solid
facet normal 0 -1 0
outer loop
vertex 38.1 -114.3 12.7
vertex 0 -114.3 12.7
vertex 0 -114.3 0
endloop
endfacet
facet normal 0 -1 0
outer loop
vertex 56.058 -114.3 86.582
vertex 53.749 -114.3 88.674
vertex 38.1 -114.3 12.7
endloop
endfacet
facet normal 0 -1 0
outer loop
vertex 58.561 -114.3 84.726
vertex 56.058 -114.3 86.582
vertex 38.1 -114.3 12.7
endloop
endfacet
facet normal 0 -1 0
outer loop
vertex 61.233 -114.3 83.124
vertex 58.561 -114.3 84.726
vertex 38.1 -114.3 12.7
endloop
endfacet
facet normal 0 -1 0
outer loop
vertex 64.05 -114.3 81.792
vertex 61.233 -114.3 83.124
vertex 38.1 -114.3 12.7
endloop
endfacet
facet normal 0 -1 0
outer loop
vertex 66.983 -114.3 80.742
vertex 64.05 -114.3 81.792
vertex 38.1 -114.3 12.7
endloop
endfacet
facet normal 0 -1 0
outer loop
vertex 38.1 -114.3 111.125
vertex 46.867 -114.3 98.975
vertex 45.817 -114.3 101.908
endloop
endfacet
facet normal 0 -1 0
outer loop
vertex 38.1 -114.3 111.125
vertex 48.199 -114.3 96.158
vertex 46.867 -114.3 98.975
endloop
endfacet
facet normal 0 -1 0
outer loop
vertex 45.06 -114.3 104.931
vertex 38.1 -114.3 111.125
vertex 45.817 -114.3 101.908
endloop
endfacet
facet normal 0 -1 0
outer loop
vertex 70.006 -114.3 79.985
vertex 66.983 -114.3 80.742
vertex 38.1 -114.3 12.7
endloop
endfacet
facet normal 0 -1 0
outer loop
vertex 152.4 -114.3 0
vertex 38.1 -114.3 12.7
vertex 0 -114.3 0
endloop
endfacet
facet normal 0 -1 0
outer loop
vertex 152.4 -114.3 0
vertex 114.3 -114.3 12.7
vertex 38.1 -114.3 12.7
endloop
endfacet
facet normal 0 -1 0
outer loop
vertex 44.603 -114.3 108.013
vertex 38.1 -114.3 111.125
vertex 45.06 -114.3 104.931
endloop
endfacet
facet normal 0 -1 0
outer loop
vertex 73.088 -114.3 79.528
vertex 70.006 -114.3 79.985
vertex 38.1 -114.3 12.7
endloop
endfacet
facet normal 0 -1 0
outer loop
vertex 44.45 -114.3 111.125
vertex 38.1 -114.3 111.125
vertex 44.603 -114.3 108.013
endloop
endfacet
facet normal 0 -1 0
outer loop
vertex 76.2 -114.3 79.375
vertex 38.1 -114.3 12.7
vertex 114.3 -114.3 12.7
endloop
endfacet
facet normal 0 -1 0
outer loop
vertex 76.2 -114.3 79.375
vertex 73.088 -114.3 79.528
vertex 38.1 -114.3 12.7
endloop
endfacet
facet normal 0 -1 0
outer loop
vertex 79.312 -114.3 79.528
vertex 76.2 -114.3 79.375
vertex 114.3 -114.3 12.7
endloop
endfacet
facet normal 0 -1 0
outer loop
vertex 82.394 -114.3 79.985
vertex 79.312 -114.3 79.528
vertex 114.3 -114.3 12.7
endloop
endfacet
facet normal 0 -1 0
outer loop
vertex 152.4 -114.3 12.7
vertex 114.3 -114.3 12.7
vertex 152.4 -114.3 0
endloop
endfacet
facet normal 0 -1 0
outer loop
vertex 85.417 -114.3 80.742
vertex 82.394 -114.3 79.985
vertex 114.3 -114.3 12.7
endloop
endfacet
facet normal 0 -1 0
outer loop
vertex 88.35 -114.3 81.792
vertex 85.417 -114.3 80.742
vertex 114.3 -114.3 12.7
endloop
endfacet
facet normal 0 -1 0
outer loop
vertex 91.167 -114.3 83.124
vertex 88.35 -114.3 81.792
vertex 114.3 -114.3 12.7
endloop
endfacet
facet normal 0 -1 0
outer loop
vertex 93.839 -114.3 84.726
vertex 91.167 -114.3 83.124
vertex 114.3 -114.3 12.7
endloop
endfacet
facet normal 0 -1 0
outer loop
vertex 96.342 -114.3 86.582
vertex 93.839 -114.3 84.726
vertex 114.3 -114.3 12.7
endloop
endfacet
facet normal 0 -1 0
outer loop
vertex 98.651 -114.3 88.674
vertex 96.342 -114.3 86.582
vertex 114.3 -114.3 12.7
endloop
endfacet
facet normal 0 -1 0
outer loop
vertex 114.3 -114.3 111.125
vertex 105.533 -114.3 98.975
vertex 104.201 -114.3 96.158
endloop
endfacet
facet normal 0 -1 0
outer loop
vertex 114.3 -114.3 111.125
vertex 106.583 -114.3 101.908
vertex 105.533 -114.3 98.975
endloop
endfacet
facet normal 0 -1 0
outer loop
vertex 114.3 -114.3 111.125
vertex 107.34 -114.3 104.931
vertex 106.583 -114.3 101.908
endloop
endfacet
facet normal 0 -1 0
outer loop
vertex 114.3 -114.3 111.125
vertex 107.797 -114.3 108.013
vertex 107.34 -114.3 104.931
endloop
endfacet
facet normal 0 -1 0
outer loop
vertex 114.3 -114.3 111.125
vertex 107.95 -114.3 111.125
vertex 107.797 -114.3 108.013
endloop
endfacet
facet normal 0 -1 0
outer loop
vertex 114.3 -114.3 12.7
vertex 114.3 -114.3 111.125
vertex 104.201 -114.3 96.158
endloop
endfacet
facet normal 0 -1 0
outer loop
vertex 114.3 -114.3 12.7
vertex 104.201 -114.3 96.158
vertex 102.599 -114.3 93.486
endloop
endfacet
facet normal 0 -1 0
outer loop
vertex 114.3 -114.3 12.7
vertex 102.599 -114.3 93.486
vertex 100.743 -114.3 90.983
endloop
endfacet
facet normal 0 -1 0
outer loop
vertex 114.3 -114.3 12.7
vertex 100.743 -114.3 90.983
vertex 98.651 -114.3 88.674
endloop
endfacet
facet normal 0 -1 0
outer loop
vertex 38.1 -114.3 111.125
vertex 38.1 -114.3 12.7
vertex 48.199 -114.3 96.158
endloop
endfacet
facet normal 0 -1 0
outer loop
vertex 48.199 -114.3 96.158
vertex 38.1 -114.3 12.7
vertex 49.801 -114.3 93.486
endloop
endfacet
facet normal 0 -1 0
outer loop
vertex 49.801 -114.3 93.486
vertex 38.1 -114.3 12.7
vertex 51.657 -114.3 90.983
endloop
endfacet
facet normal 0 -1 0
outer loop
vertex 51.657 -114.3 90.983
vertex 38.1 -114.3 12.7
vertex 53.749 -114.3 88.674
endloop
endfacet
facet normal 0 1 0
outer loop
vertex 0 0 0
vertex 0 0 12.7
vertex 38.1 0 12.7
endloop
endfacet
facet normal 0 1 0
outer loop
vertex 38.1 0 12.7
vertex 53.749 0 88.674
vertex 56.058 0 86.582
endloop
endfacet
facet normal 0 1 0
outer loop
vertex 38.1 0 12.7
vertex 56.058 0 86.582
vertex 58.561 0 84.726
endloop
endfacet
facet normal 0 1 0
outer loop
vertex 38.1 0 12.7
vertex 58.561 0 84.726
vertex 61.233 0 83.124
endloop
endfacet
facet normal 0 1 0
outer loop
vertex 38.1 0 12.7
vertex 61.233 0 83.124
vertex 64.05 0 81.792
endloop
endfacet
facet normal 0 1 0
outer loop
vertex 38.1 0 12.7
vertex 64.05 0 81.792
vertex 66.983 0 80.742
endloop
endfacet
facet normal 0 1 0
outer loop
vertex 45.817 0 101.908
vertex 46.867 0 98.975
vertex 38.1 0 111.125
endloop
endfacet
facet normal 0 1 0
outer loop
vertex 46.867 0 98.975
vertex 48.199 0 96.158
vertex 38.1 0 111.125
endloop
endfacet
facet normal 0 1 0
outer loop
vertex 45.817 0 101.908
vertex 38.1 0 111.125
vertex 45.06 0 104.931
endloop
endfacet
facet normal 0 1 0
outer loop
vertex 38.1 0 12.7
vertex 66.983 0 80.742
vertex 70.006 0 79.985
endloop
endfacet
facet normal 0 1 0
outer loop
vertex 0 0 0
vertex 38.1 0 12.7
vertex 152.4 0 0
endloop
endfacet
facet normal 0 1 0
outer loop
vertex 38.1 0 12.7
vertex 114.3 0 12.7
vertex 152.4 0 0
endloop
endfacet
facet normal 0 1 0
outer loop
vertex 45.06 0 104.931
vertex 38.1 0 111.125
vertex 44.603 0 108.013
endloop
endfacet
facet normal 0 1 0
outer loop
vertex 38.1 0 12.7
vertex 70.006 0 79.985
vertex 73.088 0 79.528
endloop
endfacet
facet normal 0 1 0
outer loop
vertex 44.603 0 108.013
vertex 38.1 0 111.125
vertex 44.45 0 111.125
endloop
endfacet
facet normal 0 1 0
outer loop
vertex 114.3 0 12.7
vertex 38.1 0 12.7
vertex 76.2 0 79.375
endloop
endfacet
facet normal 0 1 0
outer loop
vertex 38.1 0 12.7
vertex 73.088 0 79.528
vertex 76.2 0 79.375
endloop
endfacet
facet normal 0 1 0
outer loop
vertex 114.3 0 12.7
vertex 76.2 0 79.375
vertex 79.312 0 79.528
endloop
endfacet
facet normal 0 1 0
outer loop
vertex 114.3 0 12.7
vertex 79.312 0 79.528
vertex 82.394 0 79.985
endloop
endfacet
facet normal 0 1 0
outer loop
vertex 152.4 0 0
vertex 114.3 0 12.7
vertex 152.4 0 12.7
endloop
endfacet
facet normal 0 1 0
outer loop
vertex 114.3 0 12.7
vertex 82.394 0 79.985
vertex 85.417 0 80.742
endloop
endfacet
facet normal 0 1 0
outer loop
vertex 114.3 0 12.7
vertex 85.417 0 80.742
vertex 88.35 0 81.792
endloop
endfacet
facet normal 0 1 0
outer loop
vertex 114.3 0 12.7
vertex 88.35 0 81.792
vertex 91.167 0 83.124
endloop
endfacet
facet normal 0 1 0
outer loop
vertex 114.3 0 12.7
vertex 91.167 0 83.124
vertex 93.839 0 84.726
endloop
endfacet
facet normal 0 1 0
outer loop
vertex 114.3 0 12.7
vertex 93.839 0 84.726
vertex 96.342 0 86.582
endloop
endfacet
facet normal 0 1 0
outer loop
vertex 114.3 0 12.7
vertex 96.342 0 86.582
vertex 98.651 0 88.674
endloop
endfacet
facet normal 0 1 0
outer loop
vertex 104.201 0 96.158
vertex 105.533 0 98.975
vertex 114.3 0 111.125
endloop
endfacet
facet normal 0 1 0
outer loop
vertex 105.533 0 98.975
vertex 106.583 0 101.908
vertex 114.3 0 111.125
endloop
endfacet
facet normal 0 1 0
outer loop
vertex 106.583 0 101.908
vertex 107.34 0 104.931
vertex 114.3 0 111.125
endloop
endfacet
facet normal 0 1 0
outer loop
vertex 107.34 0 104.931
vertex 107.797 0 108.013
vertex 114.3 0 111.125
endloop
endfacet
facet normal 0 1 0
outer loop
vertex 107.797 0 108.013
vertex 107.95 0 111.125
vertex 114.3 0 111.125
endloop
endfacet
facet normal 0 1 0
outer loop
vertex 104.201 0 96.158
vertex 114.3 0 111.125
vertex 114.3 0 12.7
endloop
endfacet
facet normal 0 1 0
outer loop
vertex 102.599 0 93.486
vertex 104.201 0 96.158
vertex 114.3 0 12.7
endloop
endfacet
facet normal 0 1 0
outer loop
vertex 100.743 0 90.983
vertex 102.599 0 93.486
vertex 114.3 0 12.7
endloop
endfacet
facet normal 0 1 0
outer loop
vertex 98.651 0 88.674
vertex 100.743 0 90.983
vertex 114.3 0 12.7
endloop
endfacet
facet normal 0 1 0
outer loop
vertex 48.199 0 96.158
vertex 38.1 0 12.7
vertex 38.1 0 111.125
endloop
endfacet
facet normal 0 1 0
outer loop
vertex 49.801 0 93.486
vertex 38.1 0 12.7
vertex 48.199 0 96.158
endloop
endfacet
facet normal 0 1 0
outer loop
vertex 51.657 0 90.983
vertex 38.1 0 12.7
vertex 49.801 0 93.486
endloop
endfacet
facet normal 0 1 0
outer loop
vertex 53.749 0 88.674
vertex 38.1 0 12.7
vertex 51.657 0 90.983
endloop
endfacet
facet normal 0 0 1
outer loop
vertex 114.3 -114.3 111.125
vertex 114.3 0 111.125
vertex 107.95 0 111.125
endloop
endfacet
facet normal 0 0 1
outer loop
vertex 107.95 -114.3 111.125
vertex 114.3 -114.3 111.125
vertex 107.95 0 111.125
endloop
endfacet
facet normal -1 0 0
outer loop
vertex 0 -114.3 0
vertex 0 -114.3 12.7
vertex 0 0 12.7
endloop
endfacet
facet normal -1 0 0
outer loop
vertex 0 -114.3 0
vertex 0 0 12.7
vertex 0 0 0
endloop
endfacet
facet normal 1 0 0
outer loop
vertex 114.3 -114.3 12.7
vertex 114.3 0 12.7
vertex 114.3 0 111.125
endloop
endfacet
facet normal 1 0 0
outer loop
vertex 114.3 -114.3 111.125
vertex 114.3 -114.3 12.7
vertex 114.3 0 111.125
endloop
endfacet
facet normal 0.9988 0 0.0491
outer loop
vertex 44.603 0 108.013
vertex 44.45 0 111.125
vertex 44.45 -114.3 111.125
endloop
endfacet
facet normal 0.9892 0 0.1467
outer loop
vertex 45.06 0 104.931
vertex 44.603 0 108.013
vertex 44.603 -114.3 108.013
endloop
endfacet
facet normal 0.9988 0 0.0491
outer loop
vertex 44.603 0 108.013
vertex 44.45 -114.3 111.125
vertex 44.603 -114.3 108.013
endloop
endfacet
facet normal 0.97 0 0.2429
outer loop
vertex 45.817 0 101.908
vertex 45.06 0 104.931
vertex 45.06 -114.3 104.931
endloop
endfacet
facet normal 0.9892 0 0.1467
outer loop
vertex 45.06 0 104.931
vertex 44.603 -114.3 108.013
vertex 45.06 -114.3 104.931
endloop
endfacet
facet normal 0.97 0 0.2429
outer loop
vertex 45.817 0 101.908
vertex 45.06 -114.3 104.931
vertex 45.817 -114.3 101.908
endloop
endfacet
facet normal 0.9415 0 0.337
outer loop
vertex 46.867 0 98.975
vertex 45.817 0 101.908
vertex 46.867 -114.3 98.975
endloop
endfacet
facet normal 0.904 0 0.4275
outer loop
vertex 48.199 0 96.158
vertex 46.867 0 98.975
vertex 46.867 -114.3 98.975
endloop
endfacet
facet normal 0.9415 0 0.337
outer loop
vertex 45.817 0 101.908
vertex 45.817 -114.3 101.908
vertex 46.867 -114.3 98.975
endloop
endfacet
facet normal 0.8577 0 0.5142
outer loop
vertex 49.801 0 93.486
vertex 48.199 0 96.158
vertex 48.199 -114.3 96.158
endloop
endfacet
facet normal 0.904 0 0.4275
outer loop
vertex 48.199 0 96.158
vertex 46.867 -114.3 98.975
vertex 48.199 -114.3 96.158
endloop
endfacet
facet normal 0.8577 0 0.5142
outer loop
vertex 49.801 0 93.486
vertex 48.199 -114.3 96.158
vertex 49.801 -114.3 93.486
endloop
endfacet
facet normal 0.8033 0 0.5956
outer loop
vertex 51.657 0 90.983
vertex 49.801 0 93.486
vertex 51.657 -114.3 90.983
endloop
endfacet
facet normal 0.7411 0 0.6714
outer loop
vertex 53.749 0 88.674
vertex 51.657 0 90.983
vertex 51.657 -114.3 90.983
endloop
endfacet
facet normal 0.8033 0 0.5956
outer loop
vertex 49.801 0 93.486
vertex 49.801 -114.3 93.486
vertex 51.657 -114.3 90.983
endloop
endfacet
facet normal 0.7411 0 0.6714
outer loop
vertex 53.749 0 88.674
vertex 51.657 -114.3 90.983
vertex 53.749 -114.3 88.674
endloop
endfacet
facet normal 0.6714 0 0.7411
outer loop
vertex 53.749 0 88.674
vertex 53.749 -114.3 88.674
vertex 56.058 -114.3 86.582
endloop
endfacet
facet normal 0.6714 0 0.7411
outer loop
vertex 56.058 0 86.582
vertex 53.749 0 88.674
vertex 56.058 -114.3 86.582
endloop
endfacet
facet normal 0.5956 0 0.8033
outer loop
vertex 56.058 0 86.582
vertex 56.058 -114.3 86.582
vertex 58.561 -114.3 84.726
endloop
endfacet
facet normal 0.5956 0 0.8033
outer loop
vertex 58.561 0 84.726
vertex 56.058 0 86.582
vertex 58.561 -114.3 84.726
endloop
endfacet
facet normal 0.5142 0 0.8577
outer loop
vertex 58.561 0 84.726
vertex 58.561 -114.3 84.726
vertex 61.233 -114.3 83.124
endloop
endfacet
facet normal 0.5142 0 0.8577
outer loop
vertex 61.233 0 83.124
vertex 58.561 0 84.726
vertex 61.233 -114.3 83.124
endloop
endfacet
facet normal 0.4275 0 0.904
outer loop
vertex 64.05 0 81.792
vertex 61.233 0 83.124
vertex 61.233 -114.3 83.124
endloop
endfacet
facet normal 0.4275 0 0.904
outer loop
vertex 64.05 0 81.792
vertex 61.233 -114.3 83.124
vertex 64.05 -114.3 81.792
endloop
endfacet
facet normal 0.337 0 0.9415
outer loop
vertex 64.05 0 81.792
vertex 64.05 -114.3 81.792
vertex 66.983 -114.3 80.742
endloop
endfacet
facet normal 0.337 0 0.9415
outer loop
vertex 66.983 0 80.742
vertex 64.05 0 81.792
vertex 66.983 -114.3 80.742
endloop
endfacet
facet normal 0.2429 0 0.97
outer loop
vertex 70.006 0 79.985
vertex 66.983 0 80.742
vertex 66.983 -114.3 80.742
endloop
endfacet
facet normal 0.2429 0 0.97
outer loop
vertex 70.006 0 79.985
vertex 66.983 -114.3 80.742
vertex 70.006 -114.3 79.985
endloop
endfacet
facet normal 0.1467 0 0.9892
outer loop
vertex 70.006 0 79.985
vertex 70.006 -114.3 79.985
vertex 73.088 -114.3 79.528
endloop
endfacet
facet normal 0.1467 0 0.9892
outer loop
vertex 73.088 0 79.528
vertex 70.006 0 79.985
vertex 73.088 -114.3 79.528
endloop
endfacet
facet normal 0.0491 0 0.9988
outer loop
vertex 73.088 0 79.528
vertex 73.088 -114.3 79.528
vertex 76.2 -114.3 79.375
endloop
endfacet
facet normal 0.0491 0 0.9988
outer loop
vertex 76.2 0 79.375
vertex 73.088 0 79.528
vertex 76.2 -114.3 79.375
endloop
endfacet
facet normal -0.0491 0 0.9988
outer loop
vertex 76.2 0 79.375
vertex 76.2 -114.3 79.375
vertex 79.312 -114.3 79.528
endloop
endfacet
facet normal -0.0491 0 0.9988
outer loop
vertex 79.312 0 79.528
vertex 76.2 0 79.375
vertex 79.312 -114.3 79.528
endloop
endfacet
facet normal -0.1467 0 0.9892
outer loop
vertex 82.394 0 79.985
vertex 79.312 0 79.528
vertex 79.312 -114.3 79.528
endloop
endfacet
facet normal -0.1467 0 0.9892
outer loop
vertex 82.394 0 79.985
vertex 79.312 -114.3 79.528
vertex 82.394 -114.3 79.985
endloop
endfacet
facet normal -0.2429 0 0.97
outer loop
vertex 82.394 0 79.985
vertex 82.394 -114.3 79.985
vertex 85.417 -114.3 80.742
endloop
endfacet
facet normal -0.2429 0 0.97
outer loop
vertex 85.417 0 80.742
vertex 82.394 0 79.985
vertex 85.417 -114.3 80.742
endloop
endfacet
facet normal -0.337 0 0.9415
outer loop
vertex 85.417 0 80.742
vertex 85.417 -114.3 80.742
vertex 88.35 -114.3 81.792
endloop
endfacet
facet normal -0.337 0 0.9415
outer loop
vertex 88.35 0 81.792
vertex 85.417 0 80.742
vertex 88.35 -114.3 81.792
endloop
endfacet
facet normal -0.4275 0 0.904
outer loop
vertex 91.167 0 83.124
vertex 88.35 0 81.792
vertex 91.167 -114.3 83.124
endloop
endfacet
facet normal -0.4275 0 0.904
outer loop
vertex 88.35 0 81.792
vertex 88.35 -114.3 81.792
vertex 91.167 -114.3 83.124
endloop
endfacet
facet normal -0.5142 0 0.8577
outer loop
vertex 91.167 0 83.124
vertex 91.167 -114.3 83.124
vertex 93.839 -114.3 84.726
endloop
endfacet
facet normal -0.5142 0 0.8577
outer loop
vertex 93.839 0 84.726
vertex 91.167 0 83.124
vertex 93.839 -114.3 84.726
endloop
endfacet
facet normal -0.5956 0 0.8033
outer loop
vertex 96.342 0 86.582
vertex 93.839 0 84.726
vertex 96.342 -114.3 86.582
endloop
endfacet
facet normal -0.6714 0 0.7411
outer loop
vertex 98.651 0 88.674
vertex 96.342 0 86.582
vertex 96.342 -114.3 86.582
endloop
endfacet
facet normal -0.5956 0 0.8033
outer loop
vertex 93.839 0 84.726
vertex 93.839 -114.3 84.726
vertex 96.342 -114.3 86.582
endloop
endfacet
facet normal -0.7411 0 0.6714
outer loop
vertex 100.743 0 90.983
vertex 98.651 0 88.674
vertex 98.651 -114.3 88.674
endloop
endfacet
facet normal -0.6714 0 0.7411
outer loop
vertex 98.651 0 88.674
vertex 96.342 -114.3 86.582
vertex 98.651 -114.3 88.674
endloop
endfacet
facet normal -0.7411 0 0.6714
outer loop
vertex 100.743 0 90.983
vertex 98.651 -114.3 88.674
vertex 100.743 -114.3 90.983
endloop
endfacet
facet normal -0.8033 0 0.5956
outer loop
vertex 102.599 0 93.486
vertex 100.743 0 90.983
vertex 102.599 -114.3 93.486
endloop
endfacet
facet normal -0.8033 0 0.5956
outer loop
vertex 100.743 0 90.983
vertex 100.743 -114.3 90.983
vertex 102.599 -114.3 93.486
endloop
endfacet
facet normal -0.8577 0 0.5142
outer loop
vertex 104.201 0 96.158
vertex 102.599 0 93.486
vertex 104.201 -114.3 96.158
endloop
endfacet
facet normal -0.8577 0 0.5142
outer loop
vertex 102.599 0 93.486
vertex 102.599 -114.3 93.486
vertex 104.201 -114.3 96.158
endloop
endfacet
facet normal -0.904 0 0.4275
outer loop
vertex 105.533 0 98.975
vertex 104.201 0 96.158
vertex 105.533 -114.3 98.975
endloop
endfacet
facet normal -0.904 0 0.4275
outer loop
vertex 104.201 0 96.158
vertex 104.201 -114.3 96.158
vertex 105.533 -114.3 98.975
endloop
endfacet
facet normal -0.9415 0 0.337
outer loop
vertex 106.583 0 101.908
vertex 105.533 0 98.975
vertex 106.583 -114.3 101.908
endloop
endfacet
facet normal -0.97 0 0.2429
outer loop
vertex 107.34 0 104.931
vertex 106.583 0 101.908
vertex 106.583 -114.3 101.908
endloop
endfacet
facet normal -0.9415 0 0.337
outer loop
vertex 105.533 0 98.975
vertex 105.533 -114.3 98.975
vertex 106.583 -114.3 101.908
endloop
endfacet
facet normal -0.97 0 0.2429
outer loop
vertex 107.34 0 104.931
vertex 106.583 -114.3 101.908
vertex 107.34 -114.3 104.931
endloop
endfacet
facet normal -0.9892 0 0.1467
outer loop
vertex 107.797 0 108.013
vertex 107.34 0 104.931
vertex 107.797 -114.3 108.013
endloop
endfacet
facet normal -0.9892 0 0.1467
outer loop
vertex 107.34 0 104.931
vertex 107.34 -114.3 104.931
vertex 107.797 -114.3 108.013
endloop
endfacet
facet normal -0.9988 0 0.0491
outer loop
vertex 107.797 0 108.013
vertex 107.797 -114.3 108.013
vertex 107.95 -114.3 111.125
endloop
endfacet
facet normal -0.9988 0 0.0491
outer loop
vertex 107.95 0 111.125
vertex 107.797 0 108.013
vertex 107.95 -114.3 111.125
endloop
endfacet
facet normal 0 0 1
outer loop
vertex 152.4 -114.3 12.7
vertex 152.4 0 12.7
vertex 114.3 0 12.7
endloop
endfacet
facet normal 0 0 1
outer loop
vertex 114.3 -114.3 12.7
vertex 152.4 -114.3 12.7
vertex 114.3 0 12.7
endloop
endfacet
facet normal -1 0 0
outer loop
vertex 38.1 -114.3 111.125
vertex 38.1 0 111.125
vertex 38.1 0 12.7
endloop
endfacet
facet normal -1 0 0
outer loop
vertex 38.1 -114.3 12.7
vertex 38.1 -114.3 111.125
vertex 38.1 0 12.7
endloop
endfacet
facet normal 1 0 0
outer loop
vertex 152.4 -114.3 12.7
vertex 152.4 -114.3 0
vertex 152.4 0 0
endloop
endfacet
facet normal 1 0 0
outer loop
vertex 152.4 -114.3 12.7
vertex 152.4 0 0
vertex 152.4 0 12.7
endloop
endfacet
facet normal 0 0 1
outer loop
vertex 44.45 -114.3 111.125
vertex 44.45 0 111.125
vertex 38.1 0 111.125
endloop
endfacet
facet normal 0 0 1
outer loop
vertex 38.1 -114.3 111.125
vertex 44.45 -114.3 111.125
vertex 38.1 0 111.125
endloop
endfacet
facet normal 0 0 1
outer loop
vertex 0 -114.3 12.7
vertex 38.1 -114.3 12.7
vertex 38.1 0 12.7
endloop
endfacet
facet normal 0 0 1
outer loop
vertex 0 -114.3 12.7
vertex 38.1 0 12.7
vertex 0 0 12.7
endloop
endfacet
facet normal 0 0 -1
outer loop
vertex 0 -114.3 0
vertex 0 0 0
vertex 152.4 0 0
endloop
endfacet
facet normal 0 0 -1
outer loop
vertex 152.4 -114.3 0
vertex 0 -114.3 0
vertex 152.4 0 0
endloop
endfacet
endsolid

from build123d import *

# Parameters (mm, degrees)
F1_DEPTH = 114.3
F3_DEPTH = 114.301


with BuildPart() as f1:
    # F0 (on Front) → F1 (new body)
    with BuildSketch(Plane.XZ):
        Polygon((0, 12.7), (0, 0), (152.4, 0), (152.4, 12.7), (114.3, 12.7), (114.3, 111.125), (38.1, 111.125), (38.1, 12.7), align=None)
    extrude(amount=F1_DEPTH)

    # F2 (on face) → F3 (cut, through all)
    with BuildSketch(Plane.XZ.offset(114.3)):
        with BuildLine():
            Line((107.95, 111.125), (44.45, 111.125))
            ThreePointArc((44.45, 111.125), (76.2, 79.375), (107.95, 111.125))
        make_face()
    extrude(amount=-F3_DEPTH, mode=Mode.SUBTRACT)


solid = f1.part
